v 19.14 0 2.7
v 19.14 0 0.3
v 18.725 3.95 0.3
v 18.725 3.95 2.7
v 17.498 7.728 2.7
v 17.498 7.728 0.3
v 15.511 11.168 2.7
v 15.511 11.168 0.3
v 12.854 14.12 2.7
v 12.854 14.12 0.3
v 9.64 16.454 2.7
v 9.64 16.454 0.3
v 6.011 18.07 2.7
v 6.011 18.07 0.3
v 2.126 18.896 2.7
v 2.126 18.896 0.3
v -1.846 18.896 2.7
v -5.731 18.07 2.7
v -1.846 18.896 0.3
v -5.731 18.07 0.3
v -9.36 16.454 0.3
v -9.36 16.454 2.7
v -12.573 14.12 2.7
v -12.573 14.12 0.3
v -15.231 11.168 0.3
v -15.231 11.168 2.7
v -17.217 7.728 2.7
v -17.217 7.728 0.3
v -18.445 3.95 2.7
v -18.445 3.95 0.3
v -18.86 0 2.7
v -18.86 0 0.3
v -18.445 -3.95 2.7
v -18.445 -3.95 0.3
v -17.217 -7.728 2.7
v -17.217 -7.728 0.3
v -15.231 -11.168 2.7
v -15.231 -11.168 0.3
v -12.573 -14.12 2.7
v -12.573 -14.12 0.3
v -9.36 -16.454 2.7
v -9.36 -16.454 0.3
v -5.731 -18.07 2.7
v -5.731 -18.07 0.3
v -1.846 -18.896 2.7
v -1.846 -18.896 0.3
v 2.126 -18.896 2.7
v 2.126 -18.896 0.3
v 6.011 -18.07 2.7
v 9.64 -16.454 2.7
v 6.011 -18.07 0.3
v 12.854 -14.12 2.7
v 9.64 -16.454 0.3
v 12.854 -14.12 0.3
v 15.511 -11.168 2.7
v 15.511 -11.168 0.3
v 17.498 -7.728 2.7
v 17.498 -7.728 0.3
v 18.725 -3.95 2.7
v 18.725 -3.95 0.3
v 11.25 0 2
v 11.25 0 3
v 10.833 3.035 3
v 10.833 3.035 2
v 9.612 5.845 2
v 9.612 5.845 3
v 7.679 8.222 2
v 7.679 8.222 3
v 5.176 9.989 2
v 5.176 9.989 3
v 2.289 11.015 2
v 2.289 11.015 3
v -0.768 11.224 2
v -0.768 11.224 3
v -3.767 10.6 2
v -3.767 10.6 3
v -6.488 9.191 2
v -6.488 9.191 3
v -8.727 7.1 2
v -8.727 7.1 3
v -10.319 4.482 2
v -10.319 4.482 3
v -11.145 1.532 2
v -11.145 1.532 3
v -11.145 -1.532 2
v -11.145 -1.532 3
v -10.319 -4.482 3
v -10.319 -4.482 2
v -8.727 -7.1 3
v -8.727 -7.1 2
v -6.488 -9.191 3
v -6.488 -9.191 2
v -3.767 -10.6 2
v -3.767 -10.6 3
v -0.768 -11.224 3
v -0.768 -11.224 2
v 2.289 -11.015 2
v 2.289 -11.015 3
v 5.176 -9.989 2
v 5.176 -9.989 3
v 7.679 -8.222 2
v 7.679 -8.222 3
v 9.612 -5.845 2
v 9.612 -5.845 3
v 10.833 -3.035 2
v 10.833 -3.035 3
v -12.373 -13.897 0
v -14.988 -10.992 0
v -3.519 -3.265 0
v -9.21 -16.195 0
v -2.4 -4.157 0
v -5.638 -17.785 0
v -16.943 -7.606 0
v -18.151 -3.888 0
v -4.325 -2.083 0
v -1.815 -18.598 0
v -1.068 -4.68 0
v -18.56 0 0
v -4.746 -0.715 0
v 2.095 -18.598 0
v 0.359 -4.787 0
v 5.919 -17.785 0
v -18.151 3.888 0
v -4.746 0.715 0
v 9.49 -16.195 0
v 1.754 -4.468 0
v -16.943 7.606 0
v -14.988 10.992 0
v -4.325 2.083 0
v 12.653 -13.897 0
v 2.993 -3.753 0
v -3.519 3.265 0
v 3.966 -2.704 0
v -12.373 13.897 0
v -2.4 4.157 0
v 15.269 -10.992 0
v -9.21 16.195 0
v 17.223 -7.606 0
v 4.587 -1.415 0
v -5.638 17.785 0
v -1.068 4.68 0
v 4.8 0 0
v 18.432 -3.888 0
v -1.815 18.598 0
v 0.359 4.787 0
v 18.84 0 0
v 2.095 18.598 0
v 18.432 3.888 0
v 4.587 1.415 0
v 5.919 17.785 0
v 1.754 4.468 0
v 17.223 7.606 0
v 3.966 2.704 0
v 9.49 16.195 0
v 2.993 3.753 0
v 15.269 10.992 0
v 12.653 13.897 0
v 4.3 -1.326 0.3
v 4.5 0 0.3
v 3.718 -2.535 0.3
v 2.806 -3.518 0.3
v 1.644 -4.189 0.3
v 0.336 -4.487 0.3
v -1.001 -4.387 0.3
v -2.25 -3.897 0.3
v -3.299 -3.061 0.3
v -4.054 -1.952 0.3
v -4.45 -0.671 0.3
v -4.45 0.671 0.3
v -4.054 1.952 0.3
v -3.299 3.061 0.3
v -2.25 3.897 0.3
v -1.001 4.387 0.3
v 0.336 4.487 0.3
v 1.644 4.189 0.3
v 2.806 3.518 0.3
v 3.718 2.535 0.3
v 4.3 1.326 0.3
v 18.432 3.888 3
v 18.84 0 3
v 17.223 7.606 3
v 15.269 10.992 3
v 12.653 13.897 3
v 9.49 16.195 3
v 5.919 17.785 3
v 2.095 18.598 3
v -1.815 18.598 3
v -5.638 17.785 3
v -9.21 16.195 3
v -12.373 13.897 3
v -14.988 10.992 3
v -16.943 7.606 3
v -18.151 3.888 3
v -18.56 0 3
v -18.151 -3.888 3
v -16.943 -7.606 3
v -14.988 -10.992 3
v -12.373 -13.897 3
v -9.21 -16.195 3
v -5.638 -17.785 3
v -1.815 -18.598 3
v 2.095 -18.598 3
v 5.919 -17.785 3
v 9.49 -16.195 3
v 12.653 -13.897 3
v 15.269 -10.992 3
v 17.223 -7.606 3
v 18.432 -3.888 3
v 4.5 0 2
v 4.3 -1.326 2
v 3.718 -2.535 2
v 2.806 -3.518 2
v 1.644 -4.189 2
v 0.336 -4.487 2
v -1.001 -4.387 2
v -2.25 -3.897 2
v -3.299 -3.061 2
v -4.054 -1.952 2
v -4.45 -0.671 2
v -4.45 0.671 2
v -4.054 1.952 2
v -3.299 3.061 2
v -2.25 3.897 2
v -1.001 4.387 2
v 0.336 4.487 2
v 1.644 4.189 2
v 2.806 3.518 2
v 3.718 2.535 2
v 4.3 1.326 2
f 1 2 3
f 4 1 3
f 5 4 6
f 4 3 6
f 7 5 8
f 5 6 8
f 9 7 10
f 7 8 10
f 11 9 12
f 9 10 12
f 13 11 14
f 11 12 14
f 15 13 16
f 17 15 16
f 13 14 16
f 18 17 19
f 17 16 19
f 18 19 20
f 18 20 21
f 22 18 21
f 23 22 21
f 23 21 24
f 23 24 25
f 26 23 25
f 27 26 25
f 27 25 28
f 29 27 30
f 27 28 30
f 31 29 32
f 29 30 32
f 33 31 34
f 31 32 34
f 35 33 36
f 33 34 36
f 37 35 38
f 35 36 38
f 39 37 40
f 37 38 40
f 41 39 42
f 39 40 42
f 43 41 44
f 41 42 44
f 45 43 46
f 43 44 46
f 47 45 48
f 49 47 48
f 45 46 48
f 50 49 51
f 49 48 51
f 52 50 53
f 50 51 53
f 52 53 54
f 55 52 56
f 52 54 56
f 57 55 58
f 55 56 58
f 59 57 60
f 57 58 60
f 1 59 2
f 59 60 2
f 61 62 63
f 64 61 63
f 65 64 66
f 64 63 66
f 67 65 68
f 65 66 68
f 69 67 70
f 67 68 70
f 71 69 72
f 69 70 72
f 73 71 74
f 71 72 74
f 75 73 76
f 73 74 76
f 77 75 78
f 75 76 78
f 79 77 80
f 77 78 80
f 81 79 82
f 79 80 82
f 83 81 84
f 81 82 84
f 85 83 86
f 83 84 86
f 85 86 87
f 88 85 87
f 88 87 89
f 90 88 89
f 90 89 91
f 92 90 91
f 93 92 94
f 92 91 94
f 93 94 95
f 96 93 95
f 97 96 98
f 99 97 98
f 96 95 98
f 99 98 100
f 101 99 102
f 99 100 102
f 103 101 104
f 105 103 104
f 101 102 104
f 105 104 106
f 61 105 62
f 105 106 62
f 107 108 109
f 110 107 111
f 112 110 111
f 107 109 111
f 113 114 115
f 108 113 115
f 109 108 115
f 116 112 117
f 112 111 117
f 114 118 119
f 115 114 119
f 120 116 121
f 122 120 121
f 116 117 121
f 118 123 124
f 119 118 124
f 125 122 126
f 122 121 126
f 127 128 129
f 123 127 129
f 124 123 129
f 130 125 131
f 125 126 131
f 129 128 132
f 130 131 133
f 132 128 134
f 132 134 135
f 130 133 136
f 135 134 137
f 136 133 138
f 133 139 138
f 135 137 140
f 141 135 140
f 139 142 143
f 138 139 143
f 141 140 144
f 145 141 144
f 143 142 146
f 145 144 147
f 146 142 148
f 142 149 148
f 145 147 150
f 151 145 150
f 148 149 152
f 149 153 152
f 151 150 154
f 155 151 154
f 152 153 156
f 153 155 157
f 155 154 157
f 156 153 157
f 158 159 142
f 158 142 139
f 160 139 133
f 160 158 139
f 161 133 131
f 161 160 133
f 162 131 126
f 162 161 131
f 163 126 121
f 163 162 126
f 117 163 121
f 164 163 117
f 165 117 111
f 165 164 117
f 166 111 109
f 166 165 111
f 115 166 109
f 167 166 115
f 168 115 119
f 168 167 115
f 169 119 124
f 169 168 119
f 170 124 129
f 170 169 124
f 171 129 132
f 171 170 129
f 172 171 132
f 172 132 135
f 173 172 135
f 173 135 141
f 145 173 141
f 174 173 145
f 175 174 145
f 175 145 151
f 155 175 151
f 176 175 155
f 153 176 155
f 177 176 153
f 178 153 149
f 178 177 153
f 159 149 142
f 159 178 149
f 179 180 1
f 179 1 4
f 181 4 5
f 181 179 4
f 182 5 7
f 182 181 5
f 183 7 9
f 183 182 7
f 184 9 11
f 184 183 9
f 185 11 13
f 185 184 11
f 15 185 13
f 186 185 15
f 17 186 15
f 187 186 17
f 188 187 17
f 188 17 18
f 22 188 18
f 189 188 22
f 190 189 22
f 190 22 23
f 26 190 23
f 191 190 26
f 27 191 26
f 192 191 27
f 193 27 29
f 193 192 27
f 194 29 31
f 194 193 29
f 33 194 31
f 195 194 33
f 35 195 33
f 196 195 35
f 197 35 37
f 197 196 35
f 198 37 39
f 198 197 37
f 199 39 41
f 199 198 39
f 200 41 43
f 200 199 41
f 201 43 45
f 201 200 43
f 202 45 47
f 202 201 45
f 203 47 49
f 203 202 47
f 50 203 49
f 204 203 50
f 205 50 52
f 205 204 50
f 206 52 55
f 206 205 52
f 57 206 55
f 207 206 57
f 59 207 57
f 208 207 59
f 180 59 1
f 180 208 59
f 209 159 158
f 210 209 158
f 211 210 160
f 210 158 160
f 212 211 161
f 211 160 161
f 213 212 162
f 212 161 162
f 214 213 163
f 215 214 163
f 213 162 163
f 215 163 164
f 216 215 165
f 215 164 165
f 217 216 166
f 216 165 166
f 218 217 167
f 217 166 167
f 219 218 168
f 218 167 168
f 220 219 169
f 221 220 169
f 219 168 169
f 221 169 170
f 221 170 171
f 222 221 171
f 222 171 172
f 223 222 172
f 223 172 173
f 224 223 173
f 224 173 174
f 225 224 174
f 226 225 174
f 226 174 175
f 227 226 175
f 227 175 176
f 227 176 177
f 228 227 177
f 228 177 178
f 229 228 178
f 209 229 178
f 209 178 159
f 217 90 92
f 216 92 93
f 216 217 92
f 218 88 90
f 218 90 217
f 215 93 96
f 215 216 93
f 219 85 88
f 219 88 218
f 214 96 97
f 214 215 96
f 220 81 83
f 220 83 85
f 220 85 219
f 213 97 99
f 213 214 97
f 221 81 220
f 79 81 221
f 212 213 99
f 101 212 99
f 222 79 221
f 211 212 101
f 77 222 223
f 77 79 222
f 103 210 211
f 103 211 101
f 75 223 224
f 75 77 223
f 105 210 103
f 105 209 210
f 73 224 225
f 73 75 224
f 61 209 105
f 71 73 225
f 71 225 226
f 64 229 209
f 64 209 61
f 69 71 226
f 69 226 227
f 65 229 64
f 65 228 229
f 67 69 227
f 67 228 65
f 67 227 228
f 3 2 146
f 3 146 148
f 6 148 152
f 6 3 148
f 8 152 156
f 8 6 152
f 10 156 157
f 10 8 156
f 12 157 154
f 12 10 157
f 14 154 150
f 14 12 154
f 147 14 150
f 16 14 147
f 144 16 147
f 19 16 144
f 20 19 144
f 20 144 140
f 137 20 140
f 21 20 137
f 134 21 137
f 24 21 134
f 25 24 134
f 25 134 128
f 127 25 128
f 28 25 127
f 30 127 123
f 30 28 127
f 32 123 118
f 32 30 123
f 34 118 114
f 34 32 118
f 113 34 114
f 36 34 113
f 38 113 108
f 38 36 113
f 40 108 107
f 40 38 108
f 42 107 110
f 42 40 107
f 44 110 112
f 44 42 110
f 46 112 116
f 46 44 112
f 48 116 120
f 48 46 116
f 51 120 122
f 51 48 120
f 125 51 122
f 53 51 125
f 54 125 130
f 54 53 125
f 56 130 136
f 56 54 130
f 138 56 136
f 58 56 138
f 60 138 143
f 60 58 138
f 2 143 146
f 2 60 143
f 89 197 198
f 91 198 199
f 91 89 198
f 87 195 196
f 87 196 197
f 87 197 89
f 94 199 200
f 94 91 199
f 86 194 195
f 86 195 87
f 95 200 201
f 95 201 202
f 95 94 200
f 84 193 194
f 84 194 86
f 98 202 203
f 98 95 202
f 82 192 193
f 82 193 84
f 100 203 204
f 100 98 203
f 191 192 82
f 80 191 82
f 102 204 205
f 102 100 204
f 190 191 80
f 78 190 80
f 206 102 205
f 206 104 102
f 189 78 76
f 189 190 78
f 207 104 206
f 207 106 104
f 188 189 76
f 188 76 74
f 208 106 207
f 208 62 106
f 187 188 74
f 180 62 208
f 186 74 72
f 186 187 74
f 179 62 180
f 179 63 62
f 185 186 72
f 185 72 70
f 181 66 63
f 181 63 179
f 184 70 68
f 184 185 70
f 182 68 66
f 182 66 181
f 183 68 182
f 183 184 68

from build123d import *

# Parameters (mm, degrees)
SKETCH043_R     = 19
PAD014_DEPTH    = 3
SKETCH044_R     = 4.5
POCKET030_DEPTH = 3.001
CHAMFER014_SIZE = 0.3
CHAMFER015_SIZE = 0.3
SKETCH057_R     = 11.25
POCKET037_DEPTH = 1


with BuildPart() as part:
    # Sketch043 → Pad014 (new body)
    with BuildSketch(Plane.XY):
        with Locations((0.140173, 0)):
            Circle(SKETCH043_R)
    extrude(amount=PAD014_DEPTH)

    # Sketch044 (on Face2 of Pad014) → Pocket030 (cut, through all)
    with BuildSketch(Plane(origin=(0, 0, 0), x_dir=(1, 0, 0), z_dir=(0, 0, -1))):
        Circle(SKETCH044_R)
    extrude(amount=-POCKET030_DEPTH, mode=Mode.SUBTRACT)

    # Chamfer014
    chamfer014_edges = [part.edges().sort_by_distance(p)[0] for p in [
        (-4.5, 0, 0),
        (-4.5, 0, 3),
    ]]
    chamfer(chamfer014_edges, length=CHAMFER014_SIZE)

    # Chamfer015
    chamfer015_edges = [part.edges().sort_by_distance(p)[0] for p in [
        (-18.859827, 0, 0),
        (-18.859827, 0, 3),
    ]]
    chamfer(chamfer015_edges, length=CHAMFER015_SIZE)

    # Sketch057 (on Face8 of Chamfer015) → Pocket037 (cut)
    with BuildSketch(Plane.XY.offset(3)):
        Circle(SKETCH057_R)
    extrude(amount=-POCKET037_DEPTH, mode=Mode.SUBTRACT)


solid = part.part
